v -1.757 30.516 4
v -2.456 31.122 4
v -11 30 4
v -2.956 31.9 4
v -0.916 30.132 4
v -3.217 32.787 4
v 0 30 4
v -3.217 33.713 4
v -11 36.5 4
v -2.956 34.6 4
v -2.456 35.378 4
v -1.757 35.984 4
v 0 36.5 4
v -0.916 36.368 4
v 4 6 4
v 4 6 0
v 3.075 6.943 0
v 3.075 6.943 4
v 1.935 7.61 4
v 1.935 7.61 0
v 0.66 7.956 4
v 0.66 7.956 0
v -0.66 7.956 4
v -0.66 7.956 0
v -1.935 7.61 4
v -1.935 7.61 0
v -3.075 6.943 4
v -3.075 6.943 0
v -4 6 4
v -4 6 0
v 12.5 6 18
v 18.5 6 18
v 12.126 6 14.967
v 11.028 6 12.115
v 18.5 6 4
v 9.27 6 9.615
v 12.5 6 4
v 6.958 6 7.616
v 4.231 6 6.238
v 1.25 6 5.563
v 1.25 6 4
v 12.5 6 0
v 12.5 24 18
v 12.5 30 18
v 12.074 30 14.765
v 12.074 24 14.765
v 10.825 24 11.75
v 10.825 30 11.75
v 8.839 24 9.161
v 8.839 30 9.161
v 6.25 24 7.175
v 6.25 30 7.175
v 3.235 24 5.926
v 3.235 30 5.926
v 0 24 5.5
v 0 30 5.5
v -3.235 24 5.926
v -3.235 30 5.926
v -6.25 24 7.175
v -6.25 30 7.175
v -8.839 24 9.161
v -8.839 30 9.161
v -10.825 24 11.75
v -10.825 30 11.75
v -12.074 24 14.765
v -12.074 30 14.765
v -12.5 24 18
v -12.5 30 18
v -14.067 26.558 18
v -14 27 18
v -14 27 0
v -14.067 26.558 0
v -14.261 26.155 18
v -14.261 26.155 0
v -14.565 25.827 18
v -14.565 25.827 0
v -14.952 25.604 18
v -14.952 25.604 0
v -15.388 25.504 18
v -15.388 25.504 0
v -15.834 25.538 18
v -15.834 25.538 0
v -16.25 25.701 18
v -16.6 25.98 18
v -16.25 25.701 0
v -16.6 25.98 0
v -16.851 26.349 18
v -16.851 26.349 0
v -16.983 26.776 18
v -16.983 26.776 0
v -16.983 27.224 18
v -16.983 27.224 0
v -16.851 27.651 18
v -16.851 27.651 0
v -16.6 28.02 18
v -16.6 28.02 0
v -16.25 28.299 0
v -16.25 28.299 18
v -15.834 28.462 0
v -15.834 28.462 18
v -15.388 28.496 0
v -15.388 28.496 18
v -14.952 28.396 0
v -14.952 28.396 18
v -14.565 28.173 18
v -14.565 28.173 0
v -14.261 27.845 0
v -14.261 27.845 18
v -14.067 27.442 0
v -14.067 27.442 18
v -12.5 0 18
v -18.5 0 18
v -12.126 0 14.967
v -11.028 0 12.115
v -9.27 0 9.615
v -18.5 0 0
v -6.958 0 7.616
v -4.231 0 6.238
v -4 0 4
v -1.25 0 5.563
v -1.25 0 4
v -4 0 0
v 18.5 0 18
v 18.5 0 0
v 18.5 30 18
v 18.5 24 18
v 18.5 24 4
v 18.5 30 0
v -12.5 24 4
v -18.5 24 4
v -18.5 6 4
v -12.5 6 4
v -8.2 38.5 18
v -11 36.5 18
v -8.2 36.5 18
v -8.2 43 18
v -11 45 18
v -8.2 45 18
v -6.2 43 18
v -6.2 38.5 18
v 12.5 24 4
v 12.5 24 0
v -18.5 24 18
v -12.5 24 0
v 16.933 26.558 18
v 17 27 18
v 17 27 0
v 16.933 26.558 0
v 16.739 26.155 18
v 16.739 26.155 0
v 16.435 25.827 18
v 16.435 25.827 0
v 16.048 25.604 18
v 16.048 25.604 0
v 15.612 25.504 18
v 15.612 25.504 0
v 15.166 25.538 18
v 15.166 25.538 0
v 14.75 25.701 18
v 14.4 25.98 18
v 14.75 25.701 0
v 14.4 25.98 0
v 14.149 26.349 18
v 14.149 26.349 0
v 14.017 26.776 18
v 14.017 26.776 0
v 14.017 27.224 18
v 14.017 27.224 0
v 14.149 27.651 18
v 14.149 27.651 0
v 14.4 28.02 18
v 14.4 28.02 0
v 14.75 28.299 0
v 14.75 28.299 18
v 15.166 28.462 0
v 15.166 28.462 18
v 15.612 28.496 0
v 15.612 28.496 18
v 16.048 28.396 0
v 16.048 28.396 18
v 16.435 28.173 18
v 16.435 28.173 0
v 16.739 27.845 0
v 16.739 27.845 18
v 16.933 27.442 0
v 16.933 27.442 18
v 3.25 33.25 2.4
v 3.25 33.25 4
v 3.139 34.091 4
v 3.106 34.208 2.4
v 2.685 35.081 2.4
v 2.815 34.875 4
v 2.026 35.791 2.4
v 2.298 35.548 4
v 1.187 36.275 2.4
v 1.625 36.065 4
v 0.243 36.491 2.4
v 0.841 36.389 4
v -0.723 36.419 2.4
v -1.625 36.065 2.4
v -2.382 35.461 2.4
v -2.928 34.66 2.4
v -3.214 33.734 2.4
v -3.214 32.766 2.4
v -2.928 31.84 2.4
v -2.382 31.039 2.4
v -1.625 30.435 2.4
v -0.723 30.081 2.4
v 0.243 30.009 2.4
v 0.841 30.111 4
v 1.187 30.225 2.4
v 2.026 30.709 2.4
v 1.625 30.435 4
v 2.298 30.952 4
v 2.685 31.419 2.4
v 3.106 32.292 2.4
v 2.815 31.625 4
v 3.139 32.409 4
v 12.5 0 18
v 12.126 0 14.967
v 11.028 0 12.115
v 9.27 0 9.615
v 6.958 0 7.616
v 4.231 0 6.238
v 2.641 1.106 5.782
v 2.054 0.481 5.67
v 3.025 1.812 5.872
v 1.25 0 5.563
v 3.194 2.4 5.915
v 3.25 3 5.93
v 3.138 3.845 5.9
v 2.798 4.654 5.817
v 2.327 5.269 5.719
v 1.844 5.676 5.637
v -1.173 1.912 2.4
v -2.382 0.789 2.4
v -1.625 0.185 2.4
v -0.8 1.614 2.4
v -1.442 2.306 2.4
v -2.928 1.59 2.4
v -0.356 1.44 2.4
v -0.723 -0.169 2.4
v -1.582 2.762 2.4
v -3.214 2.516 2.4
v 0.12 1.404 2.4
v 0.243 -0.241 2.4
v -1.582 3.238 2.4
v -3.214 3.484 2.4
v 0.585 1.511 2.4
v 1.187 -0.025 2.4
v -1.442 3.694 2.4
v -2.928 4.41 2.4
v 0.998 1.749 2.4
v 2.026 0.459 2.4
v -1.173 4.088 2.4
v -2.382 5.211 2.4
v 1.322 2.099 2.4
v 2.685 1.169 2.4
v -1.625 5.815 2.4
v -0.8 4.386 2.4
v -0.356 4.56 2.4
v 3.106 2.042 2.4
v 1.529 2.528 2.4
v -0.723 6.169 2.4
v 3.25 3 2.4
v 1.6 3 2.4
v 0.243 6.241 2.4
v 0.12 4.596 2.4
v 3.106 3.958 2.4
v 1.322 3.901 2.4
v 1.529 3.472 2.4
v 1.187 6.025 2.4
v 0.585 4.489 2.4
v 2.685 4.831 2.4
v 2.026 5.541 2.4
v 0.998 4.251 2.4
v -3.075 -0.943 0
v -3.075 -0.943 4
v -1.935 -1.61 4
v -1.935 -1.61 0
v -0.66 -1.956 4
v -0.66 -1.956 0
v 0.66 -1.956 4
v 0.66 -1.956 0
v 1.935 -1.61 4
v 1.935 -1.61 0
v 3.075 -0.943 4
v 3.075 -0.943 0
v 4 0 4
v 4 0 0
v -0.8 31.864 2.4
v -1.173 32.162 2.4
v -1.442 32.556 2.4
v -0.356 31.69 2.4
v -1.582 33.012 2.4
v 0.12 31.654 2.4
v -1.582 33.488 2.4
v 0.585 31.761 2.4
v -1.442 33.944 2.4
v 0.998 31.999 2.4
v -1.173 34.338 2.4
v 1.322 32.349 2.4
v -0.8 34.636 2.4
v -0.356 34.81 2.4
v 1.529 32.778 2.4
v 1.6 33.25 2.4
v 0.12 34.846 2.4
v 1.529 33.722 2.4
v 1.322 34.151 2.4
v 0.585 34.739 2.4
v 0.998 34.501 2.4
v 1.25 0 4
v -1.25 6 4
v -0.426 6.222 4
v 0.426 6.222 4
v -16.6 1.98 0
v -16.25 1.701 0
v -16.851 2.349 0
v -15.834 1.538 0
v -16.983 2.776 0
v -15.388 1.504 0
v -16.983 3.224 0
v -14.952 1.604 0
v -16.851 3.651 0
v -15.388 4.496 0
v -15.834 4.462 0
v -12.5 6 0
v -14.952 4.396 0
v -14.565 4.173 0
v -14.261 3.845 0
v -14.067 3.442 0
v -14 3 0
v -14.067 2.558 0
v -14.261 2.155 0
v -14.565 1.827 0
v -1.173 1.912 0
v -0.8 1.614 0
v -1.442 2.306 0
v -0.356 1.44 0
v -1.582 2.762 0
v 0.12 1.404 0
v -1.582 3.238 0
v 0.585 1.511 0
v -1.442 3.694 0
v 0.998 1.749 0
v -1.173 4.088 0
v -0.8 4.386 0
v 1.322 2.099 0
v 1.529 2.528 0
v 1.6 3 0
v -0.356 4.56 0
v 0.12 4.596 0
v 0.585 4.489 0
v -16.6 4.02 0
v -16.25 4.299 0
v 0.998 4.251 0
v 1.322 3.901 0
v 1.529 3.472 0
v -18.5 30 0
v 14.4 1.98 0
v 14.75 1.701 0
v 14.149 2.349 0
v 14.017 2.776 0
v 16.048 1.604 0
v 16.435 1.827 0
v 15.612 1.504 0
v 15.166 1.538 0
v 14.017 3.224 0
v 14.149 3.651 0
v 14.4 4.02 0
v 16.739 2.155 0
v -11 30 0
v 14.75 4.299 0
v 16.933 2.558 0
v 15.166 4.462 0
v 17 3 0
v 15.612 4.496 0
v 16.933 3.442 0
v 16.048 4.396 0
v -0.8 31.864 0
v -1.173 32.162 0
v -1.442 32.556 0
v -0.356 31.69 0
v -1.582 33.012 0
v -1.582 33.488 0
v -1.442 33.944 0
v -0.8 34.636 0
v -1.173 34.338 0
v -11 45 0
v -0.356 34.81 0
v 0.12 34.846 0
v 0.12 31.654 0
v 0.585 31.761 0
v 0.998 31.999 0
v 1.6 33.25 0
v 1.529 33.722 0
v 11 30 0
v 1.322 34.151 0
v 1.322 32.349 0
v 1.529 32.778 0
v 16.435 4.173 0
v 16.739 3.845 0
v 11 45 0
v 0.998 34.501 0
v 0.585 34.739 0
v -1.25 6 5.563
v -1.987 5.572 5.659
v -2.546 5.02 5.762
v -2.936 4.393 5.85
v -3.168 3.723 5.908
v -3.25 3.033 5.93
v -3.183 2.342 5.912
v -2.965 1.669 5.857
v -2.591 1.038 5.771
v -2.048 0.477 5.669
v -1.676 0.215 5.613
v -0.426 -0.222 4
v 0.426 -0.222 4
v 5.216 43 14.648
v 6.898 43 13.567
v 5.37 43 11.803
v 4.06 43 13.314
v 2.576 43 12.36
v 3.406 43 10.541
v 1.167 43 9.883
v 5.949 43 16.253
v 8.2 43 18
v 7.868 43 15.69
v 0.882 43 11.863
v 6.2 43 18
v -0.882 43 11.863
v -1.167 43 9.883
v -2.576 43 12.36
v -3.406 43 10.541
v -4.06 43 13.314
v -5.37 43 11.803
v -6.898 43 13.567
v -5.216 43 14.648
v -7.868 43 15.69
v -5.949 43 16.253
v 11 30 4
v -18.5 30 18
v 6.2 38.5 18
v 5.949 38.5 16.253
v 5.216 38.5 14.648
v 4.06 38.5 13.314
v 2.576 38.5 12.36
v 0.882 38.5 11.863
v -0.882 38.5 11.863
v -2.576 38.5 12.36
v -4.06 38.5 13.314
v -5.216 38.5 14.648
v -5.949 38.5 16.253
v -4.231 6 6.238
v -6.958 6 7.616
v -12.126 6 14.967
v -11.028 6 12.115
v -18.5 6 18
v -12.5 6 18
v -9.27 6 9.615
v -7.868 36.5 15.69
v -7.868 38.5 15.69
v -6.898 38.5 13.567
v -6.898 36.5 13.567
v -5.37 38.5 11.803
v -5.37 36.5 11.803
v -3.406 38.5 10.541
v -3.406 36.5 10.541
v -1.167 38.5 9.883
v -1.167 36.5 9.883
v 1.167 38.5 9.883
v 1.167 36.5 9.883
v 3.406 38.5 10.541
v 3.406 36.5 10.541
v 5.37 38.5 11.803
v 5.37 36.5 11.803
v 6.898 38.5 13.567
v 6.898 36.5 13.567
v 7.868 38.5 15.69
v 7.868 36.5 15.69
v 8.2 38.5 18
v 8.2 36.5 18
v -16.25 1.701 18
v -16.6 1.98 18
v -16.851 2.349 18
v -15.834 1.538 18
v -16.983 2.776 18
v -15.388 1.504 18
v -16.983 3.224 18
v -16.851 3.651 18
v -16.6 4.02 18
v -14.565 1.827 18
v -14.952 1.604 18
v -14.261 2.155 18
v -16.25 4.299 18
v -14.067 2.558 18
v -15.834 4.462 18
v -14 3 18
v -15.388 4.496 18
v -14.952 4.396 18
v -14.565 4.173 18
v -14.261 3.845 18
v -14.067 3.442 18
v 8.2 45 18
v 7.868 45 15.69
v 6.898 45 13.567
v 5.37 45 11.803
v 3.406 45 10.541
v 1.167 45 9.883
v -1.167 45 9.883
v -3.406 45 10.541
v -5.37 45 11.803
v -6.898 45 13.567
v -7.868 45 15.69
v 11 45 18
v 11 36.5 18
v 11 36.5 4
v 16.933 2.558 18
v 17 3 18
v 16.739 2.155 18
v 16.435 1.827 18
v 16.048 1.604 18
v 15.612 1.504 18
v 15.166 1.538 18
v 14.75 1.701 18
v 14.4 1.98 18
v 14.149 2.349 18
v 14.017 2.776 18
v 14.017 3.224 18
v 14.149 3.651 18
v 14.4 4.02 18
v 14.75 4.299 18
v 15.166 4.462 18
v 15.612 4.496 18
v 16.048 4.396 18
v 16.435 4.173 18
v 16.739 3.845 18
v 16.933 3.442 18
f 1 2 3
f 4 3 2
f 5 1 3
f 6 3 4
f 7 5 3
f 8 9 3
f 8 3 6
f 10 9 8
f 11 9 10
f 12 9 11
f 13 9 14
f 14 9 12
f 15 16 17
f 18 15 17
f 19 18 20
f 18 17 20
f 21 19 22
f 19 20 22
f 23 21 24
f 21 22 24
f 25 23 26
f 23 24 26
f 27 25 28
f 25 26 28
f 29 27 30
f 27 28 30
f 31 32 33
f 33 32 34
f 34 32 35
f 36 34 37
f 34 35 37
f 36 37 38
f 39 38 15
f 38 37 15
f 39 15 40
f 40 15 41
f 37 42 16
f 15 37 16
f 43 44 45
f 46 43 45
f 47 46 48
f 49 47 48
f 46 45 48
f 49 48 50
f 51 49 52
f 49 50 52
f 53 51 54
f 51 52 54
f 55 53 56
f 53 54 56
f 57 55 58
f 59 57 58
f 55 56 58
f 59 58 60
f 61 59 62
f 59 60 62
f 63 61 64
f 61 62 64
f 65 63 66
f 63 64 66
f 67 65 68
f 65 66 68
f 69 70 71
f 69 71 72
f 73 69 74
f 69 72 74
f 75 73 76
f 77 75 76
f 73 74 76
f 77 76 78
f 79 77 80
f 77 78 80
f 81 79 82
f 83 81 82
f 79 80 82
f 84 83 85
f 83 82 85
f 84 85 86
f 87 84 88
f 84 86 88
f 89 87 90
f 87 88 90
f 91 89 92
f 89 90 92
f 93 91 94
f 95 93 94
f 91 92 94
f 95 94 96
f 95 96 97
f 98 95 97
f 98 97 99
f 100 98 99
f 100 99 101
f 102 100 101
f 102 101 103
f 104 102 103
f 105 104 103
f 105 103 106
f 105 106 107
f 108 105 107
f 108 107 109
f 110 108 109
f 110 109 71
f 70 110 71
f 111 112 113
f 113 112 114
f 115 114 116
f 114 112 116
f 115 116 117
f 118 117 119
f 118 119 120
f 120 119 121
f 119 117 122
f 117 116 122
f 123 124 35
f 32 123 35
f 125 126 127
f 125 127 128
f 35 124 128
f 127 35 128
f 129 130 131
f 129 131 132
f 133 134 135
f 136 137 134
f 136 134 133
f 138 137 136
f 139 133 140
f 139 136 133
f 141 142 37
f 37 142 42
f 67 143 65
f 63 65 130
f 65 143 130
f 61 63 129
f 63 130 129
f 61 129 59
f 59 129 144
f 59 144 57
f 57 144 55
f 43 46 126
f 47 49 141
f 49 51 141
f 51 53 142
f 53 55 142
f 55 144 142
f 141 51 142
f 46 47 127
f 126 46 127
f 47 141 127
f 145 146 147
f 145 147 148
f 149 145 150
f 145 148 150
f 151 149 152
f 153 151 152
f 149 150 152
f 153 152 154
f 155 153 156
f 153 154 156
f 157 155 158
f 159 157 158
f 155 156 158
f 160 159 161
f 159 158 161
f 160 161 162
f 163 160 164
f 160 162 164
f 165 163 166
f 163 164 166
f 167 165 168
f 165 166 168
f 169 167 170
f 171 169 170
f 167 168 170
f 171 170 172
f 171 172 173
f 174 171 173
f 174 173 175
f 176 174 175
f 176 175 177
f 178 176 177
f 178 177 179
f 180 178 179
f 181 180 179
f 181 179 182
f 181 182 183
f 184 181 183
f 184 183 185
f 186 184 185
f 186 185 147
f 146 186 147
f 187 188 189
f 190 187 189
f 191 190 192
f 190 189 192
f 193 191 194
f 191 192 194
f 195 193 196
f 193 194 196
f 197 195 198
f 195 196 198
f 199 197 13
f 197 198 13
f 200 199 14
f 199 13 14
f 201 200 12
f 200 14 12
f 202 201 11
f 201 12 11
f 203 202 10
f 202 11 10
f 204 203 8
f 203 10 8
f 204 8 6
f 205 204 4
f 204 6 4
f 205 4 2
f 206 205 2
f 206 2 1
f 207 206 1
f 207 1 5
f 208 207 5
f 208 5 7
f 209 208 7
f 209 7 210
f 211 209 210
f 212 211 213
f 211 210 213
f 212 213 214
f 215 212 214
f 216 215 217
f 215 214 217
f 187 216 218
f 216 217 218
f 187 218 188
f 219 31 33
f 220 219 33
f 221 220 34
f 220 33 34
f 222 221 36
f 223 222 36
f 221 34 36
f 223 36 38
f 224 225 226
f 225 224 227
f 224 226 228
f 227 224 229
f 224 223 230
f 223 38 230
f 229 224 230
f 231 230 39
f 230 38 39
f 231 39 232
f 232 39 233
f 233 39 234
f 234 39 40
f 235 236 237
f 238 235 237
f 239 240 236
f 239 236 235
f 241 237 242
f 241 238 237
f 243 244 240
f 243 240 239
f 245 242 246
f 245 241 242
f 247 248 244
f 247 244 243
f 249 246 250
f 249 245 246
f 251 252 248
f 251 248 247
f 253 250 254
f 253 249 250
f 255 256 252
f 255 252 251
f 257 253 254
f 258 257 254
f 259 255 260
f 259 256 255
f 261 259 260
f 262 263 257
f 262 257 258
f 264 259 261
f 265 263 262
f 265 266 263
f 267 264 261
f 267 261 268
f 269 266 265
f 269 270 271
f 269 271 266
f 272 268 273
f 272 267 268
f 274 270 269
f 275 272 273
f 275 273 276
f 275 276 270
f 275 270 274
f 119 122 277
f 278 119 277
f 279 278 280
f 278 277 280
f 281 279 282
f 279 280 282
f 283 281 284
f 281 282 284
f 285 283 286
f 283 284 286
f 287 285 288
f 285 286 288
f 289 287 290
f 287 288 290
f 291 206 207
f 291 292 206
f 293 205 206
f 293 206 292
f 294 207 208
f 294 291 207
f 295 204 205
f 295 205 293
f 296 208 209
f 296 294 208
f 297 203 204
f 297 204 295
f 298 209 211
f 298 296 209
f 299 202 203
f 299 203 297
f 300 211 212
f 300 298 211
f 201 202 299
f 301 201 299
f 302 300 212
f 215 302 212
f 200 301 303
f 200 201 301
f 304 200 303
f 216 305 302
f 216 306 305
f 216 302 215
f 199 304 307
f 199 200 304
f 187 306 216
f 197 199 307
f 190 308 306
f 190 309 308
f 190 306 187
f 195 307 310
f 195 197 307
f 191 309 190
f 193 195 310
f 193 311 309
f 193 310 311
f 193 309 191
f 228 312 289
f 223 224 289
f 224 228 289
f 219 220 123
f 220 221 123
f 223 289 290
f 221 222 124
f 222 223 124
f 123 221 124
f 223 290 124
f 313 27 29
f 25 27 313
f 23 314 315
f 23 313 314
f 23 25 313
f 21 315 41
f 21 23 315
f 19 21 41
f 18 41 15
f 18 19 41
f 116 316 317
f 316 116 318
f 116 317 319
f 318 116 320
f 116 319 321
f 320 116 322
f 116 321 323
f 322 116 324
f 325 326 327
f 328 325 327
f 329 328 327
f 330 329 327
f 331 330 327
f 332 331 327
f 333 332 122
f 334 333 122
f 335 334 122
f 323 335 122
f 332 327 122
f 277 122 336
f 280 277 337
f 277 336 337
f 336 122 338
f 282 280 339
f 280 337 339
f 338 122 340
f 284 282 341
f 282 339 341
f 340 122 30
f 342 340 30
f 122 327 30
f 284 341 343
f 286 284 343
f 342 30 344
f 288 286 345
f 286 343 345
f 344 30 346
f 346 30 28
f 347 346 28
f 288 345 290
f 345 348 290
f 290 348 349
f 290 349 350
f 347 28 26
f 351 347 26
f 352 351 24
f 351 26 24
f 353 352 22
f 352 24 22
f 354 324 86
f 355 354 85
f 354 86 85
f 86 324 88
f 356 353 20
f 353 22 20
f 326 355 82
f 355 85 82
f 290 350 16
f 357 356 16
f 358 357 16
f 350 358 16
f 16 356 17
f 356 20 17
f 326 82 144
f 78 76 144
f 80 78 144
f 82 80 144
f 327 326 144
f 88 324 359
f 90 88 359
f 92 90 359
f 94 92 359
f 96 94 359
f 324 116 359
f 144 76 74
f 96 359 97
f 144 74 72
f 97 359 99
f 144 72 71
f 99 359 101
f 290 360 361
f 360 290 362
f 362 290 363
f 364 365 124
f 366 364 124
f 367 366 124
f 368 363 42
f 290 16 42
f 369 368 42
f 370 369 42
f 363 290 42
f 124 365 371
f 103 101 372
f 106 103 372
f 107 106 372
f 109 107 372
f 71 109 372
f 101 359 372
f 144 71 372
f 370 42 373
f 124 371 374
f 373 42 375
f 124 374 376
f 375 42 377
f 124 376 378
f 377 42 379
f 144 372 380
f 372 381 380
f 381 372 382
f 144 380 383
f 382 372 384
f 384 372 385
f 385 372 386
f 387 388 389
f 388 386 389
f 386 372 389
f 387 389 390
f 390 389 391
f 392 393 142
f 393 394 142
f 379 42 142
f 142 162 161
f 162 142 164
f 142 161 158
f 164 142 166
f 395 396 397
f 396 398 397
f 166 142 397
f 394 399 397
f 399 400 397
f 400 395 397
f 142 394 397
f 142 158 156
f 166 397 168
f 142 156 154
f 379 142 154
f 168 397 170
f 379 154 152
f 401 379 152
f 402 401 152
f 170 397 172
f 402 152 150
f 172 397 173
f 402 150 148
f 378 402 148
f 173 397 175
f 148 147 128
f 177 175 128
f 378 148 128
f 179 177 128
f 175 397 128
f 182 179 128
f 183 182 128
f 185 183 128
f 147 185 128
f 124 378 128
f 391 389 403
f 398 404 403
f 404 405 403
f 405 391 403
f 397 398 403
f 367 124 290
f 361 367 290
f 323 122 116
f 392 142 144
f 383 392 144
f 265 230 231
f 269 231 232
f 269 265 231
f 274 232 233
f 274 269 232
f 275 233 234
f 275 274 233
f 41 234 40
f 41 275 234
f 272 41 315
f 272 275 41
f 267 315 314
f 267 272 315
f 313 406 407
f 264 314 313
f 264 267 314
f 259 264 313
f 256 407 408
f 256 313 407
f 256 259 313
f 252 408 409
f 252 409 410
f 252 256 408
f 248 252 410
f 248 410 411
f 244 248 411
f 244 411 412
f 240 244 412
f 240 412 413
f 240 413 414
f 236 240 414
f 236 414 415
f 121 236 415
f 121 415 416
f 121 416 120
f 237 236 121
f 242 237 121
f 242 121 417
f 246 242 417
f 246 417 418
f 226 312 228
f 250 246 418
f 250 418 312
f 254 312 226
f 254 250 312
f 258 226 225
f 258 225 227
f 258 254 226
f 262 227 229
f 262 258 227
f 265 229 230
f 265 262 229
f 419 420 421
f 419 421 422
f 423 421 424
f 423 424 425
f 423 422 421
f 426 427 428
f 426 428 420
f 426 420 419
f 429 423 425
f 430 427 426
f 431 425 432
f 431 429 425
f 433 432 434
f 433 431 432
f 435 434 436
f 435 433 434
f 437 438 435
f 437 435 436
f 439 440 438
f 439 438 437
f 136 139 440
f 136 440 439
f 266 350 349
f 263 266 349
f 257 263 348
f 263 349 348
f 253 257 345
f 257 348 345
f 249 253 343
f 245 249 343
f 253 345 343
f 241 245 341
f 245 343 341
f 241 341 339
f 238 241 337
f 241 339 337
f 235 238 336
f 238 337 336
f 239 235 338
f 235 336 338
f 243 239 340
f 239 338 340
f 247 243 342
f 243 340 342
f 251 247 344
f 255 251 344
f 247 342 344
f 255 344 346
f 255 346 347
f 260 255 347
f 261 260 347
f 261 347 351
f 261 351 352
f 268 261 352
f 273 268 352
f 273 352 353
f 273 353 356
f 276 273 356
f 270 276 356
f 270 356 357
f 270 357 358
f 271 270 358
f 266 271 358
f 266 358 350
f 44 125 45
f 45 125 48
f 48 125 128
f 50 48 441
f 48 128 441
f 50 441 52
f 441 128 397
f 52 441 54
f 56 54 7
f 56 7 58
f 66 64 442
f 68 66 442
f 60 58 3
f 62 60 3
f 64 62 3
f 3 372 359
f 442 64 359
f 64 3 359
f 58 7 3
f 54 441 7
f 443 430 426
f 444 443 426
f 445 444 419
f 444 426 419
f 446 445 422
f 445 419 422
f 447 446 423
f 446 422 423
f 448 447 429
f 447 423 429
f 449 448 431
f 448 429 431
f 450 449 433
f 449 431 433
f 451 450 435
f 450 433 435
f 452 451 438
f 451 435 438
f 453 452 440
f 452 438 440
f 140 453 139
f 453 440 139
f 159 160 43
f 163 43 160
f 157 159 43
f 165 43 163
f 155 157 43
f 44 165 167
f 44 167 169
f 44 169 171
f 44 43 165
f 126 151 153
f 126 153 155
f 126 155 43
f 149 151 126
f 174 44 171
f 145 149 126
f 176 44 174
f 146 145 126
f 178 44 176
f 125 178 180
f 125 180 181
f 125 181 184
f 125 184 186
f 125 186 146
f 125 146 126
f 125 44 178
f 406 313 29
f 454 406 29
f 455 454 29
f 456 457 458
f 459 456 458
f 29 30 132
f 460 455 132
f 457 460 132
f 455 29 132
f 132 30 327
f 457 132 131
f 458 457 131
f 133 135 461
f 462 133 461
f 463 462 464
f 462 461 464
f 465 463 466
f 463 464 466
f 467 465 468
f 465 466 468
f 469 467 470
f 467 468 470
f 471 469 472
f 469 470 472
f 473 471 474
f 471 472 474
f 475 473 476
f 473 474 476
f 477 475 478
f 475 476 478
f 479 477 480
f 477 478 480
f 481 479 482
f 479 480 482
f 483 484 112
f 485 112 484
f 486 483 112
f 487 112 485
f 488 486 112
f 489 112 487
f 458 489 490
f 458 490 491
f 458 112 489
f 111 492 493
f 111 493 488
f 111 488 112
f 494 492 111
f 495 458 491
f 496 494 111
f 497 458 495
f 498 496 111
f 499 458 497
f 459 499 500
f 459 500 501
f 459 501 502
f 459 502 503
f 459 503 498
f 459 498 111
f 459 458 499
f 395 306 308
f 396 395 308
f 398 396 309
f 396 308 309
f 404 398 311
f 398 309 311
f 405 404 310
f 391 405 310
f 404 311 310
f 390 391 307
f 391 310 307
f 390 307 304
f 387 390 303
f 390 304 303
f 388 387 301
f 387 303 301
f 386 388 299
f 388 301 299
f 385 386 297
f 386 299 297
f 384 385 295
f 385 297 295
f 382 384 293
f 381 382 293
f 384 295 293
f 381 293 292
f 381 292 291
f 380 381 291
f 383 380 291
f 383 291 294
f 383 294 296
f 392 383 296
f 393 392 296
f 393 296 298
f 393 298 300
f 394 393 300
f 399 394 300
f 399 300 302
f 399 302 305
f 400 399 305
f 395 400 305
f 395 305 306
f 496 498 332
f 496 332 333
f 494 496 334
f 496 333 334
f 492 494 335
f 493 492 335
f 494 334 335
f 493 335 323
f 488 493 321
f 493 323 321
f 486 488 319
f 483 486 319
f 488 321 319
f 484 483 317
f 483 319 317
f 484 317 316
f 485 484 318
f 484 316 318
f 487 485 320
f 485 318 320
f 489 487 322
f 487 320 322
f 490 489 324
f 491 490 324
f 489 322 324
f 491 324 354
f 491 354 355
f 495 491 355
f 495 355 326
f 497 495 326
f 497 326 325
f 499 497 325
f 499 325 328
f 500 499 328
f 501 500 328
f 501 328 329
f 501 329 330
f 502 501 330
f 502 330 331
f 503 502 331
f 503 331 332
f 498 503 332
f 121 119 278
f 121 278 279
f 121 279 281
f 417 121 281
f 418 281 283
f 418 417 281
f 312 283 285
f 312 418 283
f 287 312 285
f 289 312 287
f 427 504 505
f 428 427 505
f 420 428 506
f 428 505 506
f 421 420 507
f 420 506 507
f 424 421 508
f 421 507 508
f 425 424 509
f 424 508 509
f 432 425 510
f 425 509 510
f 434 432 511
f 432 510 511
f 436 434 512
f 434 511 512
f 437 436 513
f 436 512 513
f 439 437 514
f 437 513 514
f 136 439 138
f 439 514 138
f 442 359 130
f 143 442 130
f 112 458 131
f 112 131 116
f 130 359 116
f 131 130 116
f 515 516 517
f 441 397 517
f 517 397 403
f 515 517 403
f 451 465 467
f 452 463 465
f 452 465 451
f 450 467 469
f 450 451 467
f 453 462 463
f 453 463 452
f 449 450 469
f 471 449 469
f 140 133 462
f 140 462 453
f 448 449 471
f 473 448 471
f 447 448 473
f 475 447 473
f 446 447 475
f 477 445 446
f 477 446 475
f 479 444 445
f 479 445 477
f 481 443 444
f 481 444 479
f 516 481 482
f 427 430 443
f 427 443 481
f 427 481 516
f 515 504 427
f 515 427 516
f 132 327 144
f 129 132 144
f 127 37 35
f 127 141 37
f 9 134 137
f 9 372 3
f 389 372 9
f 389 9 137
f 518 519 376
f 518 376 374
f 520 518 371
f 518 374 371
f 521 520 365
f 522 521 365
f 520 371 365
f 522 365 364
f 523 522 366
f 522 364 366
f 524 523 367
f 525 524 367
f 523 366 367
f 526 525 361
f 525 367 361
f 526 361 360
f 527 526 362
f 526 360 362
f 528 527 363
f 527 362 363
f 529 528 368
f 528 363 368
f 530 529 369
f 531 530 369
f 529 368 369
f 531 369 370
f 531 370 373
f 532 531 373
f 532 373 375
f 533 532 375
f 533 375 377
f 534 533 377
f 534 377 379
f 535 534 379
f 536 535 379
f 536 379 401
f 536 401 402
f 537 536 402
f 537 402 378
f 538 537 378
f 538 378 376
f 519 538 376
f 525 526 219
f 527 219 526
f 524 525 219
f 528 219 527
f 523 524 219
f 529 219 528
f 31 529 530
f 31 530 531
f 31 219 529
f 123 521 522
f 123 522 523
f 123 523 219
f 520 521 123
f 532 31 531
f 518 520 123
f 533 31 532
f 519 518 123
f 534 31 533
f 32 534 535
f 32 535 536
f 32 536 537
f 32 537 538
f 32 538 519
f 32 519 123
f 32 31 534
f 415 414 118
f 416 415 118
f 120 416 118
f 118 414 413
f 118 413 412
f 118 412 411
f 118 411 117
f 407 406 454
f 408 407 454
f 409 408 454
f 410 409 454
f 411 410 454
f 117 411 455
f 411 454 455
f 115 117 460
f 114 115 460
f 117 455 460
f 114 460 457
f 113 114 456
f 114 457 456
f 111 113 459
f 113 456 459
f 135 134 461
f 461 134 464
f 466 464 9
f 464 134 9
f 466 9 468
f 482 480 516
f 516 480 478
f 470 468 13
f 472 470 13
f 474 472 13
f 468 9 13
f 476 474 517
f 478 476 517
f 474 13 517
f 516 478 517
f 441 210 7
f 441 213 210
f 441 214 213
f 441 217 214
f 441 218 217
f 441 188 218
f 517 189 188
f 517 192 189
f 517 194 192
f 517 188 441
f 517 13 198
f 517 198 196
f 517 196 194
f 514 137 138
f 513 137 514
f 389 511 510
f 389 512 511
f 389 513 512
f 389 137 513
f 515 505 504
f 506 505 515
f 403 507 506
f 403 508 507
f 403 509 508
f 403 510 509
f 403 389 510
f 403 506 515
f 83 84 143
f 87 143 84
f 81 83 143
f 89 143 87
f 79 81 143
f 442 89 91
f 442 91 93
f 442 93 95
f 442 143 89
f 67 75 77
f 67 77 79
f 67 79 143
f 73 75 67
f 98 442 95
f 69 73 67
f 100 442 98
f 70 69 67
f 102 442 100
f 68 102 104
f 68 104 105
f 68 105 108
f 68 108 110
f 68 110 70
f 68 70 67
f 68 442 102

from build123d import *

# Parameters (mm, degrees)
F1_DEPTH  = 4
F2_W      = 22
F2_H      = 8.5
F2_W_2    = 37
F2_H_2    = 6
F3_DEPTH  = 14
F4_R      = 6.2
F5_DEPTH  = 8.5
F6_R      = 12.5
F7_DEPTH  = 32.001
F8_R      = 8.2
F9_DEPTH  = 2
F10_R     = 8.2
F11_DEPTH = 2
F12_R     = 1.5
F13_DEPTH = 18.001
F14_R     = 1.6
F15_DEPTH = 4
F16_R     = 1.6
F17_DEPTH = 18.001
F18_R     = 3.25
F19_DEPTH = 1.6
F20_R     = 3.25
F21_DEPTH = 15.6


with BuildPart() as f1:
    # F0 (on Top) → F1 (new body)
    with BuildSketch(Plane.XY):
        with BuildLine():
            Line((4, 0), (18.5, 0))
            Line((18.5, 0), (18.5, 30))
            Line((18.5, 30), (11, 30))
            Line((11, 30), (11, 45))
            Line((11, 45), (-11, 45))
            Line((-11, 45), (-11, 30))
            Line((-11, 30), (-18.5, 30))
            Line((-18.5, 30), (-18.5, 0))
            Line((-18.5, 0), (-4, 0))
            ThreePointArc((-4, 0), (0, -2), (4, 0))
        make_face()
        with BuildLine():
            Line((-12.5, 6), (-12.5, 24))
            Line((-12.5, 24), (12.5, 24))
            Line((12.5, 24), (12.5, 6))
            Line((12.5, 6), (4, 6))
            ThreePointArc((4, 6), (0, 8), (-4, 6))
            Line((-4, 6), (-12.5, 6))
        make_face(mode=Mode.SUBTRACT)
    extrude(amount=F1_DEPTH)

    # F2 (on face) → F3 (join)
    with BuildSketch(Plane.XY.offset(4)):
        with Locations((0, 40.75)):
            Rectangle(F2_W, F2_H)
        with Locations((0, 27)):
            Rectangle(F2_W_2, F2_H_2)
        with Locations((0, 3)):
            Rectangle(F2_W_2, F2_H_2)
    extrude(amount=F3_DEPTH)

    # F4 (on face) → F5 (cut, through all)
    with BuildSketch(Plane(origin=(0, 45, 0), x_dir=(-1, 0, 0), z_dir=(0, 1, 0))):
        with Locations((0, 18)):
            Circle(F4_R)
    extrude(amount=-F5_DEPTH, mode=Mode.SUBTRACT)

    # F6 (on face) → F7 (cut, through all)
    with BuildSketch(Plane(origin=(0, 30, 0), x_dir=(-1, 0, 0), z_dir=(0, 1, 0))):
        with Locations((0, 18)):
            Circle(F6_R)
    extrude(amount=-F7_DEPTH, mode=Mode.SUBTRACT)

    # F8 (on face) → F9 (cut)
    with BuildSketch(Plane(origin=(0, 45, 0), x_dir=(-1, 0, 0), z_dir=(0, 1, 0))):
        with Locations((0, 18)):
            Circle(F8_R)
    extrude(amount=-F9_DEPTH, mode=Mode.SUBTRACT)

    # F10 (on face) → F11 (cut)
    with BuildSketch(Plane.XZ.offset(-36.5)):
        with Locations((0, 18)):
            Circle(F10_R)
    extrude(amount=-F11_DEPTH, mode=Mode.SUBTRACT)

    # F12 (on face) → F13 (cut, through all)
    with BuildSketch(Plane(origin=(0, 0, 0), x_dir=(1, 0, 0), z_dir=(0, 0, -1))):
        with Locations((-15.5, -27)):
            Circle(F12_R)
        with Locations((15.5, -27)):
            Circle(F12_R)
        with Locations((15.5, -3)):
            Circle(F12_R)
        with Locations((-15.5, -3)):
            Circle(F12_R)
    extrude(amount=-F13_DEPTH, mode=Mode.SUBTRACT)

    # F14 (on face) → F15 (cut, through all)
    with BuildSketch(Plane.XY.offset(4)):
        with Locations((0, 33.25)):
            Circle(F14_R)
    extrude(amount=-F15_DEPTH, mode=Mode.SUBTRACT)

    # F16 (on face) → F17 (cut, through all)
    with BuildSketch(Plane(origin=(0, 0, 0), x_dir=(1, 0, 0), z_dir=(0, 0, -1))):
        with Locations((0, -3)):
            Circle(F16_R)
    extrude(amount=-F17_DEPTH, mode=Mode.SUBTRACT)

    # F18 (on face) → F19 (cut)
    with BuildSketch(Plane.XY.offset(4)):
        with Locations((0, 3)):
            Circle(F18_R)
        with Locations((0, 33.25)):
            Circle(F18_R)
    extrude(amount=-F19_DEPTH, mode=Mode.SUBTRACT)

    # F20 (on face) → F21 (cut, through all)
    with BuildSketch(Plane.XY.offset(2.4)):
        with Locations((0, 3)):
            Circle(F20_R)
    extrude(amount=F21_DEPTH, mode=Mode.SUBTRACT)


solid = f1.part
